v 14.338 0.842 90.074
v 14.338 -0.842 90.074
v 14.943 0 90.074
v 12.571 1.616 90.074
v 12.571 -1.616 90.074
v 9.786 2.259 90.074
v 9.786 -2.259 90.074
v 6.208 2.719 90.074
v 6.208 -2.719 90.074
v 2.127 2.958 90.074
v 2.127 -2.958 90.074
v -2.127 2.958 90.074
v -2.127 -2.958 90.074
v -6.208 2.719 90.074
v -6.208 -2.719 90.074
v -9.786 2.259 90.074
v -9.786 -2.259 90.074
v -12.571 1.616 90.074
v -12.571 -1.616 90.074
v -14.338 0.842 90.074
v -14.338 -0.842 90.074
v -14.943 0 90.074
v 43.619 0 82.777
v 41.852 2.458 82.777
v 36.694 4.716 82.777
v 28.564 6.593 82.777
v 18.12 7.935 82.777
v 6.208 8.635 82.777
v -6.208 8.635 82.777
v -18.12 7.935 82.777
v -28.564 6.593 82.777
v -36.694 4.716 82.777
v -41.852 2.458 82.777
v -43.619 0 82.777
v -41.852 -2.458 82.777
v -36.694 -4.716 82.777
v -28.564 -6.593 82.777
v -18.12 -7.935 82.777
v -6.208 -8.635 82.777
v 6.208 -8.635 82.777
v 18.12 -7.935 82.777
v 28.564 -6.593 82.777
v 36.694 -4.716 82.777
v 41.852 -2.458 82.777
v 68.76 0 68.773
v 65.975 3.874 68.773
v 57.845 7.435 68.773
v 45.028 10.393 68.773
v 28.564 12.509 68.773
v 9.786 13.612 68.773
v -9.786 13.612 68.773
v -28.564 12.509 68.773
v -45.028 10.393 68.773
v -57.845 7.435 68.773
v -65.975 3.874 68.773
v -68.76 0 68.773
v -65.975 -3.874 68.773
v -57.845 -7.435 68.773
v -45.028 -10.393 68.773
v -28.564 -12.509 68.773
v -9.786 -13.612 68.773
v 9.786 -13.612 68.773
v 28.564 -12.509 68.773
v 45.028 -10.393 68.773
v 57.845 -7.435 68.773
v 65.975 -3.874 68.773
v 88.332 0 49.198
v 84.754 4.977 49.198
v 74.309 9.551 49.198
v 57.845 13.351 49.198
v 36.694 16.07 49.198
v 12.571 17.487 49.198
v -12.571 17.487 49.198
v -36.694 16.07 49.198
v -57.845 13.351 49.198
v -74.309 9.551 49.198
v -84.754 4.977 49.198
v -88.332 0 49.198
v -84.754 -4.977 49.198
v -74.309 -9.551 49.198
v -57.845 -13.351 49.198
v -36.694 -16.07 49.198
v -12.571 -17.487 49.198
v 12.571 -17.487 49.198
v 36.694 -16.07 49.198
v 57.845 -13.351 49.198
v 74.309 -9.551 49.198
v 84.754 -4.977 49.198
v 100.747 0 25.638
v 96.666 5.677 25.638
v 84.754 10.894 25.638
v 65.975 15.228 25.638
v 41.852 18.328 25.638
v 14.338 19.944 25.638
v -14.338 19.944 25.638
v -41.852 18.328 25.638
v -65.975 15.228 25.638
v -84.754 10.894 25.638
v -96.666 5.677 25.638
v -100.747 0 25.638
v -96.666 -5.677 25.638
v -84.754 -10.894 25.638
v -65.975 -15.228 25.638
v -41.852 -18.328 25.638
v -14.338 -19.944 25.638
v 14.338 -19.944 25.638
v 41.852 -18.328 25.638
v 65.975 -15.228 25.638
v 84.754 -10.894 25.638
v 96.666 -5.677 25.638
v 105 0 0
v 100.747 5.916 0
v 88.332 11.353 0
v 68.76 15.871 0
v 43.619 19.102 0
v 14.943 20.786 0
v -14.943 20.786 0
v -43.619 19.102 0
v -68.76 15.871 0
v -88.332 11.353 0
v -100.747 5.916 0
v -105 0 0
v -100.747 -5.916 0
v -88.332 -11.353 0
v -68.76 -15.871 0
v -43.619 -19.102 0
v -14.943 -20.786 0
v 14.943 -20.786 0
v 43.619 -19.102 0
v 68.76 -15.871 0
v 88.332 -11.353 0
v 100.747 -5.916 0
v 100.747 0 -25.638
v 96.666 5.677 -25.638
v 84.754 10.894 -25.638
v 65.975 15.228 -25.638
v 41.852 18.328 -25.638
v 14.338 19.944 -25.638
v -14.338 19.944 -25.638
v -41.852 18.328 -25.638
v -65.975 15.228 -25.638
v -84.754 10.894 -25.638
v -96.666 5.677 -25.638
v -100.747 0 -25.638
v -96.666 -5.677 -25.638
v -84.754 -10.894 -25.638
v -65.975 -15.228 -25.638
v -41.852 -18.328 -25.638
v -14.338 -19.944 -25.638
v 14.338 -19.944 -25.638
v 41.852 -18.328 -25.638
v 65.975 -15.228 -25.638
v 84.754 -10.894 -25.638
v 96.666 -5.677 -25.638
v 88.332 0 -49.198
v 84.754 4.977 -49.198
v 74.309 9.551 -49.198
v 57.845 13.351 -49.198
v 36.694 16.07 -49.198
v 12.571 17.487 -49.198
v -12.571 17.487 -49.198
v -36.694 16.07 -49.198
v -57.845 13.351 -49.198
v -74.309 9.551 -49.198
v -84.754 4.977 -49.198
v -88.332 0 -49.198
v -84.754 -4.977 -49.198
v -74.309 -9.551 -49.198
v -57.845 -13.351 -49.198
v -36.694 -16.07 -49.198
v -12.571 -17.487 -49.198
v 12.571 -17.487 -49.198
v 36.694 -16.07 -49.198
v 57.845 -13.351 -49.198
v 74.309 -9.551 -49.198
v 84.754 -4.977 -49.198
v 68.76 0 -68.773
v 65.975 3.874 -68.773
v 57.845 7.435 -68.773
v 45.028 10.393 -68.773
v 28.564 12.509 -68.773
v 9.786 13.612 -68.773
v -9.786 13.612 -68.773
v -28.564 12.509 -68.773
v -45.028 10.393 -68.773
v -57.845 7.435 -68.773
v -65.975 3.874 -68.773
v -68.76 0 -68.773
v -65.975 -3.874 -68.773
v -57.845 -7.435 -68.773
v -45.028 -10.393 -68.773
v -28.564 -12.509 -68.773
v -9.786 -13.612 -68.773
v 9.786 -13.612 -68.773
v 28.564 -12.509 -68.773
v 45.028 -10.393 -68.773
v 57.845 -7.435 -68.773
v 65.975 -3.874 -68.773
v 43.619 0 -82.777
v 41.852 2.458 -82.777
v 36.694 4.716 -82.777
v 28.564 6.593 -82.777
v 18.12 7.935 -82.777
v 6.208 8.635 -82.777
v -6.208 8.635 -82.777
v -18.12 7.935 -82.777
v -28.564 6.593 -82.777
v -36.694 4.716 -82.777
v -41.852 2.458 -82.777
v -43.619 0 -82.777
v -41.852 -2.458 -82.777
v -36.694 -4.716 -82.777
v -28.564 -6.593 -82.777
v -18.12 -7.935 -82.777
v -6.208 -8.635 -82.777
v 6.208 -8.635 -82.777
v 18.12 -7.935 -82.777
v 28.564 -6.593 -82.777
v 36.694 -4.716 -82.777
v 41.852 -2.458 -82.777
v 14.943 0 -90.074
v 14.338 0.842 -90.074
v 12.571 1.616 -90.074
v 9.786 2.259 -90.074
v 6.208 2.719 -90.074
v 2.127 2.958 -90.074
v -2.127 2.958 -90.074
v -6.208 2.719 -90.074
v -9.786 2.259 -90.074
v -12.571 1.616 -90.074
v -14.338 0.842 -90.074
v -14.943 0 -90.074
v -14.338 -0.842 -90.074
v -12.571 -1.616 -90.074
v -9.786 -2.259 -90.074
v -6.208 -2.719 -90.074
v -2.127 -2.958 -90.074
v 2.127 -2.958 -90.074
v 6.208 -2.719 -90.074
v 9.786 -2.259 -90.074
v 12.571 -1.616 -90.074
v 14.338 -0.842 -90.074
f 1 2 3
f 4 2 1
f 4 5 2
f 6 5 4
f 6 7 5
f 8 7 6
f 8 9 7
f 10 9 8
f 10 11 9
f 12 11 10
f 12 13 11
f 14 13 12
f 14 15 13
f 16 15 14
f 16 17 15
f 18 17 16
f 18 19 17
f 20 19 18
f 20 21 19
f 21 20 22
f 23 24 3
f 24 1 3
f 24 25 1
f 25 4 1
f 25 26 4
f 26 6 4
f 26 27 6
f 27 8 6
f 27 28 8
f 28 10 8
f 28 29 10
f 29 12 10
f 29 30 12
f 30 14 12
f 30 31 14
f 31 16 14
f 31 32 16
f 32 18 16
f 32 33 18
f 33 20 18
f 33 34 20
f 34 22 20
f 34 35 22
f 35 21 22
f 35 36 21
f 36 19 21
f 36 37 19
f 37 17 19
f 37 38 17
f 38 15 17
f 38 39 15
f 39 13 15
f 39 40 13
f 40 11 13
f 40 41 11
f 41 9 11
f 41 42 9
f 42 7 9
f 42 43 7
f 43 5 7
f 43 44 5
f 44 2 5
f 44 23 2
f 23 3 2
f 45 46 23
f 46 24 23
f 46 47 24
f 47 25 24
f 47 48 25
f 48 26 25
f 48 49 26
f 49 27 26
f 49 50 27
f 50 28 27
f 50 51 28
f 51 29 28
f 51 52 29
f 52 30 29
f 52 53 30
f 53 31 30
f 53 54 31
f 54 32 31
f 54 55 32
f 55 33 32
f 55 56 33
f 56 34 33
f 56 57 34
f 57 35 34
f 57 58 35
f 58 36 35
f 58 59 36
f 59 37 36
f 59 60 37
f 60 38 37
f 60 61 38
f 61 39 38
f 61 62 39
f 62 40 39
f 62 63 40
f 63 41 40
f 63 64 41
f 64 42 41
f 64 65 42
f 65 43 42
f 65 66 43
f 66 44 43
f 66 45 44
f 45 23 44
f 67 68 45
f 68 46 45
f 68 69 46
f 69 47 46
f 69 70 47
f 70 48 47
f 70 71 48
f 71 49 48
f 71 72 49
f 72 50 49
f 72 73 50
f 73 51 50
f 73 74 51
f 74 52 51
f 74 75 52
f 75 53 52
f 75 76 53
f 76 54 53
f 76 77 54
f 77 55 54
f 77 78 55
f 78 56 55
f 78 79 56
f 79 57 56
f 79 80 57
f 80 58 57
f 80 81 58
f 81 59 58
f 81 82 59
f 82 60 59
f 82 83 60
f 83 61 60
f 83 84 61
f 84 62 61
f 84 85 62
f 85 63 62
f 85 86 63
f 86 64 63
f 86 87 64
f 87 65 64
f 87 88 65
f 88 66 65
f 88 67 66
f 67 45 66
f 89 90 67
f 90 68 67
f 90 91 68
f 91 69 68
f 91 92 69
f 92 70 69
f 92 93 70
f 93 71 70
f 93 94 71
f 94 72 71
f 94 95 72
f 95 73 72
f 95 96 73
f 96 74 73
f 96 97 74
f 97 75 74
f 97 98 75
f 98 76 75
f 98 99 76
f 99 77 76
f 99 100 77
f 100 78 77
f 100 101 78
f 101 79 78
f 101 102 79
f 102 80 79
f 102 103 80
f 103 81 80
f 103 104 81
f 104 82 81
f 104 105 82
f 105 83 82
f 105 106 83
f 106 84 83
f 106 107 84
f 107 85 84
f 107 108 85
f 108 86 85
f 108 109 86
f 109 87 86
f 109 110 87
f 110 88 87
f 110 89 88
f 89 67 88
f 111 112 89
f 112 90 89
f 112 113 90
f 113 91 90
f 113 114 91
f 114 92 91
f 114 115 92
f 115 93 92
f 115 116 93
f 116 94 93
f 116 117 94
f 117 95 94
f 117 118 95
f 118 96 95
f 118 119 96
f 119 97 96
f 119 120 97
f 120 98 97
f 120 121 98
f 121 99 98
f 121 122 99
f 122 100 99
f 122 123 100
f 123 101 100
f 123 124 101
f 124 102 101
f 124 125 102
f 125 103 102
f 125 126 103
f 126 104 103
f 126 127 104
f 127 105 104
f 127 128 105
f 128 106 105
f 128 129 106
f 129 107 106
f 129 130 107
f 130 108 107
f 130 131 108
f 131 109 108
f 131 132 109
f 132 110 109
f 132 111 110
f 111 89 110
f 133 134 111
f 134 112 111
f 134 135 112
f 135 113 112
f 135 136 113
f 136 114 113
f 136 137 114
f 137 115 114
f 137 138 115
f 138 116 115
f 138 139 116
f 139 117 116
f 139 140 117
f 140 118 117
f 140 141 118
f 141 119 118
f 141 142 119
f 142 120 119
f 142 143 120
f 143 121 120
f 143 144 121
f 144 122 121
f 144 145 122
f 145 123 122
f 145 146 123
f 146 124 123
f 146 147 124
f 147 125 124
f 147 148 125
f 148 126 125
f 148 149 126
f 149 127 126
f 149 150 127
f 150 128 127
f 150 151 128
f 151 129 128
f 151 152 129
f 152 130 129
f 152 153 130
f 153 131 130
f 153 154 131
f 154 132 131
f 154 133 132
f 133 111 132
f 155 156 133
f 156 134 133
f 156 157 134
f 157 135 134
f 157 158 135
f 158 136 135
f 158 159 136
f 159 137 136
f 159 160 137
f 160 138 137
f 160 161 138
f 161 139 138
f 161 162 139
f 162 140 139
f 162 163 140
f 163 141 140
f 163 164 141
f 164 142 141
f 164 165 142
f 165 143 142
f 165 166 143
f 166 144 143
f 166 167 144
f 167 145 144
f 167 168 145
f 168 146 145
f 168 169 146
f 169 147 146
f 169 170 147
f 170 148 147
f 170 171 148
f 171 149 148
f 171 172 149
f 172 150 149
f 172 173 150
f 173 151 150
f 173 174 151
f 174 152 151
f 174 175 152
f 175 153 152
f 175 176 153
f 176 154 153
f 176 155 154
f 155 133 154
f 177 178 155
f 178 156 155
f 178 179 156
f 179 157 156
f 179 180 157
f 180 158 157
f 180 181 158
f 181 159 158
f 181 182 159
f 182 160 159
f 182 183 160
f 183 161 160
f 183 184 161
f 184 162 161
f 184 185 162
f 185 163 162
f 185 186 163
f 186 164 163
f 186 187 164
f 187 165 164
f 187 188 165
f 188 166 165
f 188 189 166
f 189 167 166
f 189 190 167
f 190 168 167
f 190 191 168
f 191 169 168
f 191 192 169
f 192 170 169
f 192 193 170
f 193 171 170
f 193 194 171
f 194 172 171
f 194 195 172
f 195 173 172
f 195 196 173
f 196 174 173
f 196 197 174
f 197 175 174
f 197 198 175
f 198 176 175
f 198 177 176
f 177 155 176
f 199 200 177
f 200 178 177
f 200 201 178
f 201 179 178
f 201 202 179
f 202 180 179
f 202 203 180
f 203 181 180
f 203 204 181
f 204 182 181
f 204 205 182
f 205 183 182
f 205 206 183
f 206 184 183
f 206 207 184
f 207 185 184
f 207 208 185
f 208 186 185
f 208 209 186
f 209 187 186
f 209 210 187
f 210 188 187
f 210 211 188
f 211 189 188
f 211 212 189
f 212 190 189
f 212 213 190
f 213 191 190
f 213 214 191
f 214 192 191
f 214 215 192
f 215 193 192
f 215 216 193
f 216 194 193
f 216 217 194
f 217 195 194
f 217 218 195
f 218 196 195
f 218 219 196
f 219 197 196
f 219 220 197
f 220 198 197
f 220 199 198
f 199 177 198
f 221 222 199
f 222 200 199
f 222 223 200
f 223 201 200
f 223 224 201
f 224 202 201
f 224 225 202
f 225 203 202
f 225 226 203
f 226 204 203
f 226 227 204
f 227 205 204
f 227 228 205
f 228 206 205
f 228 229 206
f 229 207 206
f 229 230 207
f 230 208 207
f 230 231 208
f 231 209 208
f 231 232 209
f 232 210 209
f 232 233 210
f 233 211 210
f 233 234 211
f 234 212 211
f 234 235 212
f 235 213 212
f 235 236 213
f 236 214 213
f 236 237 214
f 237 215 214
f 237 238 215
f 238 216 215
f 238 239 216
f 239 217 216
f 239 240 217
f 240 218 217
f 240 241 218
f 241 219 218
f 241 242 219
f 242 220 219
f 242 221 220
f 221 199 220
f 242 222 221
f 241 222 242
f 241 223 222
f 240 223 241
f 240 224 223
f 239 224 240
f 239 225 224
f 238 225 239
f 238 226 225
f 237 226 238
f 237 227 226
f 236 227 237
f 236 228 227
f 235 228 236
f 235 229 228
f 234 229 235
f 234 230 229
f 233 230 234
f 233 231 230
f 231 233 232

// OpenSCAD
// Generated by SolidPython 1.0.1 on 2020-07-29 00:46:51


scale(v = [15, 3, 13]) {
	sphere(r = 7);
}
/***********************************************
*********      SolidPython code:      **********
************************************************
 
# import packages: SolidPython
from solid import *
from solid.utils import *
from itertools import chain, combinations, permutations


class Resize:

    def __init__(self, scad_file):
        self.scad_file = scad_file
        #self.scad_file = import_scad(scad_file)
        # cone/cylinder param:
        self.r1 = 0
        self.r2 = 0
        self.h = 0
        # rectangular prism param:
        self.w = 0
        self.l = 0
        # ellipse param:
        self.r = 0

    # import OpenScad code (file name corresponds to shape)


    # classify shape + parameters
    def assign(self, param1, param2, param3):
        if self.scad_file == 'cone.scad':
            self.r1 = param1
            self.r2 = param2
            self.h = param3
        elif self.scad_file == 'cylinder.scad':
            self.r1 = param1
            self.r2 = param2
            self.h = param3
        elif self.scad_file == 'rectangularPrism.scad':
            self.h = param1
            self.l = param2
            self.w = param3
        else:
            self.r = param1
            self.h = param2

    # resize parameters
    def iterate(self):
        x = range(3, 20, 2)
        i = 1
        if self.scad_file == 'cone.scad':
            tempList = list(permutations(x, 2))
            for temp in tempList:
                param1 = temp[0]
                param2 = temp[1]
                filepath = 'produced_scad_files/' + 'cone' + str(param1) + '_' + str(param2) + '_' + '.scad'
                scad_render_to_file(cylinder(h=param1, r1=param2, r2=0), filepath)

        elif self.scad_file == 'cylinder.scad':
            tempList = list(permutations(x, 3))
            for temp in tempList:
                param1 = temp[0]
                param2 = temp[1]
                filepath = 'produced_scad_files/' + 'cylinder' + str(param1) + '_' + str(param2) + '_' + '.scad'
                scad_render_to_file(cylinder(h=param1, r1=param2, r2=param2), filepath)

        elif self.scad_file == 'rectangularPrism.scad':
            tempList = list(permutations(x, 3))
            for temp in tempList:
                param1 = temp[0]
                param2 = temp[1]
                param3 = temp[2]
                filepath = 'produced_scad_files/' + 'rectangularPrism' + str(param1) + '_' + str(param2) + '_' + str(
                    param3) + '.scad'
                scad_render_to_file(cube(size=(param1, param2, param3)), filepath)

        elif self.scad_file == 'ellipse.scad':
            tempList = list(permutations(x, 4))
            for temp in tempList:
                param1 = temp[0]
                param2 = temp[1]
                param3 = temp[2]
                param4 = temp[3]
                filepath = 'produced_scad_files/' + 'ellipse' + str(param1) + '_' + str(param2) + '_' + str(param3) + '_' + str(param4) + '.scad'
                scad_render_to_file(scale([param1, param2, param3])(sphere(r=param4)), filepath)

    def render_to_scadfile(self):
        scad_render_to_file(scad, 'example.scad') 
 
************************************************/
